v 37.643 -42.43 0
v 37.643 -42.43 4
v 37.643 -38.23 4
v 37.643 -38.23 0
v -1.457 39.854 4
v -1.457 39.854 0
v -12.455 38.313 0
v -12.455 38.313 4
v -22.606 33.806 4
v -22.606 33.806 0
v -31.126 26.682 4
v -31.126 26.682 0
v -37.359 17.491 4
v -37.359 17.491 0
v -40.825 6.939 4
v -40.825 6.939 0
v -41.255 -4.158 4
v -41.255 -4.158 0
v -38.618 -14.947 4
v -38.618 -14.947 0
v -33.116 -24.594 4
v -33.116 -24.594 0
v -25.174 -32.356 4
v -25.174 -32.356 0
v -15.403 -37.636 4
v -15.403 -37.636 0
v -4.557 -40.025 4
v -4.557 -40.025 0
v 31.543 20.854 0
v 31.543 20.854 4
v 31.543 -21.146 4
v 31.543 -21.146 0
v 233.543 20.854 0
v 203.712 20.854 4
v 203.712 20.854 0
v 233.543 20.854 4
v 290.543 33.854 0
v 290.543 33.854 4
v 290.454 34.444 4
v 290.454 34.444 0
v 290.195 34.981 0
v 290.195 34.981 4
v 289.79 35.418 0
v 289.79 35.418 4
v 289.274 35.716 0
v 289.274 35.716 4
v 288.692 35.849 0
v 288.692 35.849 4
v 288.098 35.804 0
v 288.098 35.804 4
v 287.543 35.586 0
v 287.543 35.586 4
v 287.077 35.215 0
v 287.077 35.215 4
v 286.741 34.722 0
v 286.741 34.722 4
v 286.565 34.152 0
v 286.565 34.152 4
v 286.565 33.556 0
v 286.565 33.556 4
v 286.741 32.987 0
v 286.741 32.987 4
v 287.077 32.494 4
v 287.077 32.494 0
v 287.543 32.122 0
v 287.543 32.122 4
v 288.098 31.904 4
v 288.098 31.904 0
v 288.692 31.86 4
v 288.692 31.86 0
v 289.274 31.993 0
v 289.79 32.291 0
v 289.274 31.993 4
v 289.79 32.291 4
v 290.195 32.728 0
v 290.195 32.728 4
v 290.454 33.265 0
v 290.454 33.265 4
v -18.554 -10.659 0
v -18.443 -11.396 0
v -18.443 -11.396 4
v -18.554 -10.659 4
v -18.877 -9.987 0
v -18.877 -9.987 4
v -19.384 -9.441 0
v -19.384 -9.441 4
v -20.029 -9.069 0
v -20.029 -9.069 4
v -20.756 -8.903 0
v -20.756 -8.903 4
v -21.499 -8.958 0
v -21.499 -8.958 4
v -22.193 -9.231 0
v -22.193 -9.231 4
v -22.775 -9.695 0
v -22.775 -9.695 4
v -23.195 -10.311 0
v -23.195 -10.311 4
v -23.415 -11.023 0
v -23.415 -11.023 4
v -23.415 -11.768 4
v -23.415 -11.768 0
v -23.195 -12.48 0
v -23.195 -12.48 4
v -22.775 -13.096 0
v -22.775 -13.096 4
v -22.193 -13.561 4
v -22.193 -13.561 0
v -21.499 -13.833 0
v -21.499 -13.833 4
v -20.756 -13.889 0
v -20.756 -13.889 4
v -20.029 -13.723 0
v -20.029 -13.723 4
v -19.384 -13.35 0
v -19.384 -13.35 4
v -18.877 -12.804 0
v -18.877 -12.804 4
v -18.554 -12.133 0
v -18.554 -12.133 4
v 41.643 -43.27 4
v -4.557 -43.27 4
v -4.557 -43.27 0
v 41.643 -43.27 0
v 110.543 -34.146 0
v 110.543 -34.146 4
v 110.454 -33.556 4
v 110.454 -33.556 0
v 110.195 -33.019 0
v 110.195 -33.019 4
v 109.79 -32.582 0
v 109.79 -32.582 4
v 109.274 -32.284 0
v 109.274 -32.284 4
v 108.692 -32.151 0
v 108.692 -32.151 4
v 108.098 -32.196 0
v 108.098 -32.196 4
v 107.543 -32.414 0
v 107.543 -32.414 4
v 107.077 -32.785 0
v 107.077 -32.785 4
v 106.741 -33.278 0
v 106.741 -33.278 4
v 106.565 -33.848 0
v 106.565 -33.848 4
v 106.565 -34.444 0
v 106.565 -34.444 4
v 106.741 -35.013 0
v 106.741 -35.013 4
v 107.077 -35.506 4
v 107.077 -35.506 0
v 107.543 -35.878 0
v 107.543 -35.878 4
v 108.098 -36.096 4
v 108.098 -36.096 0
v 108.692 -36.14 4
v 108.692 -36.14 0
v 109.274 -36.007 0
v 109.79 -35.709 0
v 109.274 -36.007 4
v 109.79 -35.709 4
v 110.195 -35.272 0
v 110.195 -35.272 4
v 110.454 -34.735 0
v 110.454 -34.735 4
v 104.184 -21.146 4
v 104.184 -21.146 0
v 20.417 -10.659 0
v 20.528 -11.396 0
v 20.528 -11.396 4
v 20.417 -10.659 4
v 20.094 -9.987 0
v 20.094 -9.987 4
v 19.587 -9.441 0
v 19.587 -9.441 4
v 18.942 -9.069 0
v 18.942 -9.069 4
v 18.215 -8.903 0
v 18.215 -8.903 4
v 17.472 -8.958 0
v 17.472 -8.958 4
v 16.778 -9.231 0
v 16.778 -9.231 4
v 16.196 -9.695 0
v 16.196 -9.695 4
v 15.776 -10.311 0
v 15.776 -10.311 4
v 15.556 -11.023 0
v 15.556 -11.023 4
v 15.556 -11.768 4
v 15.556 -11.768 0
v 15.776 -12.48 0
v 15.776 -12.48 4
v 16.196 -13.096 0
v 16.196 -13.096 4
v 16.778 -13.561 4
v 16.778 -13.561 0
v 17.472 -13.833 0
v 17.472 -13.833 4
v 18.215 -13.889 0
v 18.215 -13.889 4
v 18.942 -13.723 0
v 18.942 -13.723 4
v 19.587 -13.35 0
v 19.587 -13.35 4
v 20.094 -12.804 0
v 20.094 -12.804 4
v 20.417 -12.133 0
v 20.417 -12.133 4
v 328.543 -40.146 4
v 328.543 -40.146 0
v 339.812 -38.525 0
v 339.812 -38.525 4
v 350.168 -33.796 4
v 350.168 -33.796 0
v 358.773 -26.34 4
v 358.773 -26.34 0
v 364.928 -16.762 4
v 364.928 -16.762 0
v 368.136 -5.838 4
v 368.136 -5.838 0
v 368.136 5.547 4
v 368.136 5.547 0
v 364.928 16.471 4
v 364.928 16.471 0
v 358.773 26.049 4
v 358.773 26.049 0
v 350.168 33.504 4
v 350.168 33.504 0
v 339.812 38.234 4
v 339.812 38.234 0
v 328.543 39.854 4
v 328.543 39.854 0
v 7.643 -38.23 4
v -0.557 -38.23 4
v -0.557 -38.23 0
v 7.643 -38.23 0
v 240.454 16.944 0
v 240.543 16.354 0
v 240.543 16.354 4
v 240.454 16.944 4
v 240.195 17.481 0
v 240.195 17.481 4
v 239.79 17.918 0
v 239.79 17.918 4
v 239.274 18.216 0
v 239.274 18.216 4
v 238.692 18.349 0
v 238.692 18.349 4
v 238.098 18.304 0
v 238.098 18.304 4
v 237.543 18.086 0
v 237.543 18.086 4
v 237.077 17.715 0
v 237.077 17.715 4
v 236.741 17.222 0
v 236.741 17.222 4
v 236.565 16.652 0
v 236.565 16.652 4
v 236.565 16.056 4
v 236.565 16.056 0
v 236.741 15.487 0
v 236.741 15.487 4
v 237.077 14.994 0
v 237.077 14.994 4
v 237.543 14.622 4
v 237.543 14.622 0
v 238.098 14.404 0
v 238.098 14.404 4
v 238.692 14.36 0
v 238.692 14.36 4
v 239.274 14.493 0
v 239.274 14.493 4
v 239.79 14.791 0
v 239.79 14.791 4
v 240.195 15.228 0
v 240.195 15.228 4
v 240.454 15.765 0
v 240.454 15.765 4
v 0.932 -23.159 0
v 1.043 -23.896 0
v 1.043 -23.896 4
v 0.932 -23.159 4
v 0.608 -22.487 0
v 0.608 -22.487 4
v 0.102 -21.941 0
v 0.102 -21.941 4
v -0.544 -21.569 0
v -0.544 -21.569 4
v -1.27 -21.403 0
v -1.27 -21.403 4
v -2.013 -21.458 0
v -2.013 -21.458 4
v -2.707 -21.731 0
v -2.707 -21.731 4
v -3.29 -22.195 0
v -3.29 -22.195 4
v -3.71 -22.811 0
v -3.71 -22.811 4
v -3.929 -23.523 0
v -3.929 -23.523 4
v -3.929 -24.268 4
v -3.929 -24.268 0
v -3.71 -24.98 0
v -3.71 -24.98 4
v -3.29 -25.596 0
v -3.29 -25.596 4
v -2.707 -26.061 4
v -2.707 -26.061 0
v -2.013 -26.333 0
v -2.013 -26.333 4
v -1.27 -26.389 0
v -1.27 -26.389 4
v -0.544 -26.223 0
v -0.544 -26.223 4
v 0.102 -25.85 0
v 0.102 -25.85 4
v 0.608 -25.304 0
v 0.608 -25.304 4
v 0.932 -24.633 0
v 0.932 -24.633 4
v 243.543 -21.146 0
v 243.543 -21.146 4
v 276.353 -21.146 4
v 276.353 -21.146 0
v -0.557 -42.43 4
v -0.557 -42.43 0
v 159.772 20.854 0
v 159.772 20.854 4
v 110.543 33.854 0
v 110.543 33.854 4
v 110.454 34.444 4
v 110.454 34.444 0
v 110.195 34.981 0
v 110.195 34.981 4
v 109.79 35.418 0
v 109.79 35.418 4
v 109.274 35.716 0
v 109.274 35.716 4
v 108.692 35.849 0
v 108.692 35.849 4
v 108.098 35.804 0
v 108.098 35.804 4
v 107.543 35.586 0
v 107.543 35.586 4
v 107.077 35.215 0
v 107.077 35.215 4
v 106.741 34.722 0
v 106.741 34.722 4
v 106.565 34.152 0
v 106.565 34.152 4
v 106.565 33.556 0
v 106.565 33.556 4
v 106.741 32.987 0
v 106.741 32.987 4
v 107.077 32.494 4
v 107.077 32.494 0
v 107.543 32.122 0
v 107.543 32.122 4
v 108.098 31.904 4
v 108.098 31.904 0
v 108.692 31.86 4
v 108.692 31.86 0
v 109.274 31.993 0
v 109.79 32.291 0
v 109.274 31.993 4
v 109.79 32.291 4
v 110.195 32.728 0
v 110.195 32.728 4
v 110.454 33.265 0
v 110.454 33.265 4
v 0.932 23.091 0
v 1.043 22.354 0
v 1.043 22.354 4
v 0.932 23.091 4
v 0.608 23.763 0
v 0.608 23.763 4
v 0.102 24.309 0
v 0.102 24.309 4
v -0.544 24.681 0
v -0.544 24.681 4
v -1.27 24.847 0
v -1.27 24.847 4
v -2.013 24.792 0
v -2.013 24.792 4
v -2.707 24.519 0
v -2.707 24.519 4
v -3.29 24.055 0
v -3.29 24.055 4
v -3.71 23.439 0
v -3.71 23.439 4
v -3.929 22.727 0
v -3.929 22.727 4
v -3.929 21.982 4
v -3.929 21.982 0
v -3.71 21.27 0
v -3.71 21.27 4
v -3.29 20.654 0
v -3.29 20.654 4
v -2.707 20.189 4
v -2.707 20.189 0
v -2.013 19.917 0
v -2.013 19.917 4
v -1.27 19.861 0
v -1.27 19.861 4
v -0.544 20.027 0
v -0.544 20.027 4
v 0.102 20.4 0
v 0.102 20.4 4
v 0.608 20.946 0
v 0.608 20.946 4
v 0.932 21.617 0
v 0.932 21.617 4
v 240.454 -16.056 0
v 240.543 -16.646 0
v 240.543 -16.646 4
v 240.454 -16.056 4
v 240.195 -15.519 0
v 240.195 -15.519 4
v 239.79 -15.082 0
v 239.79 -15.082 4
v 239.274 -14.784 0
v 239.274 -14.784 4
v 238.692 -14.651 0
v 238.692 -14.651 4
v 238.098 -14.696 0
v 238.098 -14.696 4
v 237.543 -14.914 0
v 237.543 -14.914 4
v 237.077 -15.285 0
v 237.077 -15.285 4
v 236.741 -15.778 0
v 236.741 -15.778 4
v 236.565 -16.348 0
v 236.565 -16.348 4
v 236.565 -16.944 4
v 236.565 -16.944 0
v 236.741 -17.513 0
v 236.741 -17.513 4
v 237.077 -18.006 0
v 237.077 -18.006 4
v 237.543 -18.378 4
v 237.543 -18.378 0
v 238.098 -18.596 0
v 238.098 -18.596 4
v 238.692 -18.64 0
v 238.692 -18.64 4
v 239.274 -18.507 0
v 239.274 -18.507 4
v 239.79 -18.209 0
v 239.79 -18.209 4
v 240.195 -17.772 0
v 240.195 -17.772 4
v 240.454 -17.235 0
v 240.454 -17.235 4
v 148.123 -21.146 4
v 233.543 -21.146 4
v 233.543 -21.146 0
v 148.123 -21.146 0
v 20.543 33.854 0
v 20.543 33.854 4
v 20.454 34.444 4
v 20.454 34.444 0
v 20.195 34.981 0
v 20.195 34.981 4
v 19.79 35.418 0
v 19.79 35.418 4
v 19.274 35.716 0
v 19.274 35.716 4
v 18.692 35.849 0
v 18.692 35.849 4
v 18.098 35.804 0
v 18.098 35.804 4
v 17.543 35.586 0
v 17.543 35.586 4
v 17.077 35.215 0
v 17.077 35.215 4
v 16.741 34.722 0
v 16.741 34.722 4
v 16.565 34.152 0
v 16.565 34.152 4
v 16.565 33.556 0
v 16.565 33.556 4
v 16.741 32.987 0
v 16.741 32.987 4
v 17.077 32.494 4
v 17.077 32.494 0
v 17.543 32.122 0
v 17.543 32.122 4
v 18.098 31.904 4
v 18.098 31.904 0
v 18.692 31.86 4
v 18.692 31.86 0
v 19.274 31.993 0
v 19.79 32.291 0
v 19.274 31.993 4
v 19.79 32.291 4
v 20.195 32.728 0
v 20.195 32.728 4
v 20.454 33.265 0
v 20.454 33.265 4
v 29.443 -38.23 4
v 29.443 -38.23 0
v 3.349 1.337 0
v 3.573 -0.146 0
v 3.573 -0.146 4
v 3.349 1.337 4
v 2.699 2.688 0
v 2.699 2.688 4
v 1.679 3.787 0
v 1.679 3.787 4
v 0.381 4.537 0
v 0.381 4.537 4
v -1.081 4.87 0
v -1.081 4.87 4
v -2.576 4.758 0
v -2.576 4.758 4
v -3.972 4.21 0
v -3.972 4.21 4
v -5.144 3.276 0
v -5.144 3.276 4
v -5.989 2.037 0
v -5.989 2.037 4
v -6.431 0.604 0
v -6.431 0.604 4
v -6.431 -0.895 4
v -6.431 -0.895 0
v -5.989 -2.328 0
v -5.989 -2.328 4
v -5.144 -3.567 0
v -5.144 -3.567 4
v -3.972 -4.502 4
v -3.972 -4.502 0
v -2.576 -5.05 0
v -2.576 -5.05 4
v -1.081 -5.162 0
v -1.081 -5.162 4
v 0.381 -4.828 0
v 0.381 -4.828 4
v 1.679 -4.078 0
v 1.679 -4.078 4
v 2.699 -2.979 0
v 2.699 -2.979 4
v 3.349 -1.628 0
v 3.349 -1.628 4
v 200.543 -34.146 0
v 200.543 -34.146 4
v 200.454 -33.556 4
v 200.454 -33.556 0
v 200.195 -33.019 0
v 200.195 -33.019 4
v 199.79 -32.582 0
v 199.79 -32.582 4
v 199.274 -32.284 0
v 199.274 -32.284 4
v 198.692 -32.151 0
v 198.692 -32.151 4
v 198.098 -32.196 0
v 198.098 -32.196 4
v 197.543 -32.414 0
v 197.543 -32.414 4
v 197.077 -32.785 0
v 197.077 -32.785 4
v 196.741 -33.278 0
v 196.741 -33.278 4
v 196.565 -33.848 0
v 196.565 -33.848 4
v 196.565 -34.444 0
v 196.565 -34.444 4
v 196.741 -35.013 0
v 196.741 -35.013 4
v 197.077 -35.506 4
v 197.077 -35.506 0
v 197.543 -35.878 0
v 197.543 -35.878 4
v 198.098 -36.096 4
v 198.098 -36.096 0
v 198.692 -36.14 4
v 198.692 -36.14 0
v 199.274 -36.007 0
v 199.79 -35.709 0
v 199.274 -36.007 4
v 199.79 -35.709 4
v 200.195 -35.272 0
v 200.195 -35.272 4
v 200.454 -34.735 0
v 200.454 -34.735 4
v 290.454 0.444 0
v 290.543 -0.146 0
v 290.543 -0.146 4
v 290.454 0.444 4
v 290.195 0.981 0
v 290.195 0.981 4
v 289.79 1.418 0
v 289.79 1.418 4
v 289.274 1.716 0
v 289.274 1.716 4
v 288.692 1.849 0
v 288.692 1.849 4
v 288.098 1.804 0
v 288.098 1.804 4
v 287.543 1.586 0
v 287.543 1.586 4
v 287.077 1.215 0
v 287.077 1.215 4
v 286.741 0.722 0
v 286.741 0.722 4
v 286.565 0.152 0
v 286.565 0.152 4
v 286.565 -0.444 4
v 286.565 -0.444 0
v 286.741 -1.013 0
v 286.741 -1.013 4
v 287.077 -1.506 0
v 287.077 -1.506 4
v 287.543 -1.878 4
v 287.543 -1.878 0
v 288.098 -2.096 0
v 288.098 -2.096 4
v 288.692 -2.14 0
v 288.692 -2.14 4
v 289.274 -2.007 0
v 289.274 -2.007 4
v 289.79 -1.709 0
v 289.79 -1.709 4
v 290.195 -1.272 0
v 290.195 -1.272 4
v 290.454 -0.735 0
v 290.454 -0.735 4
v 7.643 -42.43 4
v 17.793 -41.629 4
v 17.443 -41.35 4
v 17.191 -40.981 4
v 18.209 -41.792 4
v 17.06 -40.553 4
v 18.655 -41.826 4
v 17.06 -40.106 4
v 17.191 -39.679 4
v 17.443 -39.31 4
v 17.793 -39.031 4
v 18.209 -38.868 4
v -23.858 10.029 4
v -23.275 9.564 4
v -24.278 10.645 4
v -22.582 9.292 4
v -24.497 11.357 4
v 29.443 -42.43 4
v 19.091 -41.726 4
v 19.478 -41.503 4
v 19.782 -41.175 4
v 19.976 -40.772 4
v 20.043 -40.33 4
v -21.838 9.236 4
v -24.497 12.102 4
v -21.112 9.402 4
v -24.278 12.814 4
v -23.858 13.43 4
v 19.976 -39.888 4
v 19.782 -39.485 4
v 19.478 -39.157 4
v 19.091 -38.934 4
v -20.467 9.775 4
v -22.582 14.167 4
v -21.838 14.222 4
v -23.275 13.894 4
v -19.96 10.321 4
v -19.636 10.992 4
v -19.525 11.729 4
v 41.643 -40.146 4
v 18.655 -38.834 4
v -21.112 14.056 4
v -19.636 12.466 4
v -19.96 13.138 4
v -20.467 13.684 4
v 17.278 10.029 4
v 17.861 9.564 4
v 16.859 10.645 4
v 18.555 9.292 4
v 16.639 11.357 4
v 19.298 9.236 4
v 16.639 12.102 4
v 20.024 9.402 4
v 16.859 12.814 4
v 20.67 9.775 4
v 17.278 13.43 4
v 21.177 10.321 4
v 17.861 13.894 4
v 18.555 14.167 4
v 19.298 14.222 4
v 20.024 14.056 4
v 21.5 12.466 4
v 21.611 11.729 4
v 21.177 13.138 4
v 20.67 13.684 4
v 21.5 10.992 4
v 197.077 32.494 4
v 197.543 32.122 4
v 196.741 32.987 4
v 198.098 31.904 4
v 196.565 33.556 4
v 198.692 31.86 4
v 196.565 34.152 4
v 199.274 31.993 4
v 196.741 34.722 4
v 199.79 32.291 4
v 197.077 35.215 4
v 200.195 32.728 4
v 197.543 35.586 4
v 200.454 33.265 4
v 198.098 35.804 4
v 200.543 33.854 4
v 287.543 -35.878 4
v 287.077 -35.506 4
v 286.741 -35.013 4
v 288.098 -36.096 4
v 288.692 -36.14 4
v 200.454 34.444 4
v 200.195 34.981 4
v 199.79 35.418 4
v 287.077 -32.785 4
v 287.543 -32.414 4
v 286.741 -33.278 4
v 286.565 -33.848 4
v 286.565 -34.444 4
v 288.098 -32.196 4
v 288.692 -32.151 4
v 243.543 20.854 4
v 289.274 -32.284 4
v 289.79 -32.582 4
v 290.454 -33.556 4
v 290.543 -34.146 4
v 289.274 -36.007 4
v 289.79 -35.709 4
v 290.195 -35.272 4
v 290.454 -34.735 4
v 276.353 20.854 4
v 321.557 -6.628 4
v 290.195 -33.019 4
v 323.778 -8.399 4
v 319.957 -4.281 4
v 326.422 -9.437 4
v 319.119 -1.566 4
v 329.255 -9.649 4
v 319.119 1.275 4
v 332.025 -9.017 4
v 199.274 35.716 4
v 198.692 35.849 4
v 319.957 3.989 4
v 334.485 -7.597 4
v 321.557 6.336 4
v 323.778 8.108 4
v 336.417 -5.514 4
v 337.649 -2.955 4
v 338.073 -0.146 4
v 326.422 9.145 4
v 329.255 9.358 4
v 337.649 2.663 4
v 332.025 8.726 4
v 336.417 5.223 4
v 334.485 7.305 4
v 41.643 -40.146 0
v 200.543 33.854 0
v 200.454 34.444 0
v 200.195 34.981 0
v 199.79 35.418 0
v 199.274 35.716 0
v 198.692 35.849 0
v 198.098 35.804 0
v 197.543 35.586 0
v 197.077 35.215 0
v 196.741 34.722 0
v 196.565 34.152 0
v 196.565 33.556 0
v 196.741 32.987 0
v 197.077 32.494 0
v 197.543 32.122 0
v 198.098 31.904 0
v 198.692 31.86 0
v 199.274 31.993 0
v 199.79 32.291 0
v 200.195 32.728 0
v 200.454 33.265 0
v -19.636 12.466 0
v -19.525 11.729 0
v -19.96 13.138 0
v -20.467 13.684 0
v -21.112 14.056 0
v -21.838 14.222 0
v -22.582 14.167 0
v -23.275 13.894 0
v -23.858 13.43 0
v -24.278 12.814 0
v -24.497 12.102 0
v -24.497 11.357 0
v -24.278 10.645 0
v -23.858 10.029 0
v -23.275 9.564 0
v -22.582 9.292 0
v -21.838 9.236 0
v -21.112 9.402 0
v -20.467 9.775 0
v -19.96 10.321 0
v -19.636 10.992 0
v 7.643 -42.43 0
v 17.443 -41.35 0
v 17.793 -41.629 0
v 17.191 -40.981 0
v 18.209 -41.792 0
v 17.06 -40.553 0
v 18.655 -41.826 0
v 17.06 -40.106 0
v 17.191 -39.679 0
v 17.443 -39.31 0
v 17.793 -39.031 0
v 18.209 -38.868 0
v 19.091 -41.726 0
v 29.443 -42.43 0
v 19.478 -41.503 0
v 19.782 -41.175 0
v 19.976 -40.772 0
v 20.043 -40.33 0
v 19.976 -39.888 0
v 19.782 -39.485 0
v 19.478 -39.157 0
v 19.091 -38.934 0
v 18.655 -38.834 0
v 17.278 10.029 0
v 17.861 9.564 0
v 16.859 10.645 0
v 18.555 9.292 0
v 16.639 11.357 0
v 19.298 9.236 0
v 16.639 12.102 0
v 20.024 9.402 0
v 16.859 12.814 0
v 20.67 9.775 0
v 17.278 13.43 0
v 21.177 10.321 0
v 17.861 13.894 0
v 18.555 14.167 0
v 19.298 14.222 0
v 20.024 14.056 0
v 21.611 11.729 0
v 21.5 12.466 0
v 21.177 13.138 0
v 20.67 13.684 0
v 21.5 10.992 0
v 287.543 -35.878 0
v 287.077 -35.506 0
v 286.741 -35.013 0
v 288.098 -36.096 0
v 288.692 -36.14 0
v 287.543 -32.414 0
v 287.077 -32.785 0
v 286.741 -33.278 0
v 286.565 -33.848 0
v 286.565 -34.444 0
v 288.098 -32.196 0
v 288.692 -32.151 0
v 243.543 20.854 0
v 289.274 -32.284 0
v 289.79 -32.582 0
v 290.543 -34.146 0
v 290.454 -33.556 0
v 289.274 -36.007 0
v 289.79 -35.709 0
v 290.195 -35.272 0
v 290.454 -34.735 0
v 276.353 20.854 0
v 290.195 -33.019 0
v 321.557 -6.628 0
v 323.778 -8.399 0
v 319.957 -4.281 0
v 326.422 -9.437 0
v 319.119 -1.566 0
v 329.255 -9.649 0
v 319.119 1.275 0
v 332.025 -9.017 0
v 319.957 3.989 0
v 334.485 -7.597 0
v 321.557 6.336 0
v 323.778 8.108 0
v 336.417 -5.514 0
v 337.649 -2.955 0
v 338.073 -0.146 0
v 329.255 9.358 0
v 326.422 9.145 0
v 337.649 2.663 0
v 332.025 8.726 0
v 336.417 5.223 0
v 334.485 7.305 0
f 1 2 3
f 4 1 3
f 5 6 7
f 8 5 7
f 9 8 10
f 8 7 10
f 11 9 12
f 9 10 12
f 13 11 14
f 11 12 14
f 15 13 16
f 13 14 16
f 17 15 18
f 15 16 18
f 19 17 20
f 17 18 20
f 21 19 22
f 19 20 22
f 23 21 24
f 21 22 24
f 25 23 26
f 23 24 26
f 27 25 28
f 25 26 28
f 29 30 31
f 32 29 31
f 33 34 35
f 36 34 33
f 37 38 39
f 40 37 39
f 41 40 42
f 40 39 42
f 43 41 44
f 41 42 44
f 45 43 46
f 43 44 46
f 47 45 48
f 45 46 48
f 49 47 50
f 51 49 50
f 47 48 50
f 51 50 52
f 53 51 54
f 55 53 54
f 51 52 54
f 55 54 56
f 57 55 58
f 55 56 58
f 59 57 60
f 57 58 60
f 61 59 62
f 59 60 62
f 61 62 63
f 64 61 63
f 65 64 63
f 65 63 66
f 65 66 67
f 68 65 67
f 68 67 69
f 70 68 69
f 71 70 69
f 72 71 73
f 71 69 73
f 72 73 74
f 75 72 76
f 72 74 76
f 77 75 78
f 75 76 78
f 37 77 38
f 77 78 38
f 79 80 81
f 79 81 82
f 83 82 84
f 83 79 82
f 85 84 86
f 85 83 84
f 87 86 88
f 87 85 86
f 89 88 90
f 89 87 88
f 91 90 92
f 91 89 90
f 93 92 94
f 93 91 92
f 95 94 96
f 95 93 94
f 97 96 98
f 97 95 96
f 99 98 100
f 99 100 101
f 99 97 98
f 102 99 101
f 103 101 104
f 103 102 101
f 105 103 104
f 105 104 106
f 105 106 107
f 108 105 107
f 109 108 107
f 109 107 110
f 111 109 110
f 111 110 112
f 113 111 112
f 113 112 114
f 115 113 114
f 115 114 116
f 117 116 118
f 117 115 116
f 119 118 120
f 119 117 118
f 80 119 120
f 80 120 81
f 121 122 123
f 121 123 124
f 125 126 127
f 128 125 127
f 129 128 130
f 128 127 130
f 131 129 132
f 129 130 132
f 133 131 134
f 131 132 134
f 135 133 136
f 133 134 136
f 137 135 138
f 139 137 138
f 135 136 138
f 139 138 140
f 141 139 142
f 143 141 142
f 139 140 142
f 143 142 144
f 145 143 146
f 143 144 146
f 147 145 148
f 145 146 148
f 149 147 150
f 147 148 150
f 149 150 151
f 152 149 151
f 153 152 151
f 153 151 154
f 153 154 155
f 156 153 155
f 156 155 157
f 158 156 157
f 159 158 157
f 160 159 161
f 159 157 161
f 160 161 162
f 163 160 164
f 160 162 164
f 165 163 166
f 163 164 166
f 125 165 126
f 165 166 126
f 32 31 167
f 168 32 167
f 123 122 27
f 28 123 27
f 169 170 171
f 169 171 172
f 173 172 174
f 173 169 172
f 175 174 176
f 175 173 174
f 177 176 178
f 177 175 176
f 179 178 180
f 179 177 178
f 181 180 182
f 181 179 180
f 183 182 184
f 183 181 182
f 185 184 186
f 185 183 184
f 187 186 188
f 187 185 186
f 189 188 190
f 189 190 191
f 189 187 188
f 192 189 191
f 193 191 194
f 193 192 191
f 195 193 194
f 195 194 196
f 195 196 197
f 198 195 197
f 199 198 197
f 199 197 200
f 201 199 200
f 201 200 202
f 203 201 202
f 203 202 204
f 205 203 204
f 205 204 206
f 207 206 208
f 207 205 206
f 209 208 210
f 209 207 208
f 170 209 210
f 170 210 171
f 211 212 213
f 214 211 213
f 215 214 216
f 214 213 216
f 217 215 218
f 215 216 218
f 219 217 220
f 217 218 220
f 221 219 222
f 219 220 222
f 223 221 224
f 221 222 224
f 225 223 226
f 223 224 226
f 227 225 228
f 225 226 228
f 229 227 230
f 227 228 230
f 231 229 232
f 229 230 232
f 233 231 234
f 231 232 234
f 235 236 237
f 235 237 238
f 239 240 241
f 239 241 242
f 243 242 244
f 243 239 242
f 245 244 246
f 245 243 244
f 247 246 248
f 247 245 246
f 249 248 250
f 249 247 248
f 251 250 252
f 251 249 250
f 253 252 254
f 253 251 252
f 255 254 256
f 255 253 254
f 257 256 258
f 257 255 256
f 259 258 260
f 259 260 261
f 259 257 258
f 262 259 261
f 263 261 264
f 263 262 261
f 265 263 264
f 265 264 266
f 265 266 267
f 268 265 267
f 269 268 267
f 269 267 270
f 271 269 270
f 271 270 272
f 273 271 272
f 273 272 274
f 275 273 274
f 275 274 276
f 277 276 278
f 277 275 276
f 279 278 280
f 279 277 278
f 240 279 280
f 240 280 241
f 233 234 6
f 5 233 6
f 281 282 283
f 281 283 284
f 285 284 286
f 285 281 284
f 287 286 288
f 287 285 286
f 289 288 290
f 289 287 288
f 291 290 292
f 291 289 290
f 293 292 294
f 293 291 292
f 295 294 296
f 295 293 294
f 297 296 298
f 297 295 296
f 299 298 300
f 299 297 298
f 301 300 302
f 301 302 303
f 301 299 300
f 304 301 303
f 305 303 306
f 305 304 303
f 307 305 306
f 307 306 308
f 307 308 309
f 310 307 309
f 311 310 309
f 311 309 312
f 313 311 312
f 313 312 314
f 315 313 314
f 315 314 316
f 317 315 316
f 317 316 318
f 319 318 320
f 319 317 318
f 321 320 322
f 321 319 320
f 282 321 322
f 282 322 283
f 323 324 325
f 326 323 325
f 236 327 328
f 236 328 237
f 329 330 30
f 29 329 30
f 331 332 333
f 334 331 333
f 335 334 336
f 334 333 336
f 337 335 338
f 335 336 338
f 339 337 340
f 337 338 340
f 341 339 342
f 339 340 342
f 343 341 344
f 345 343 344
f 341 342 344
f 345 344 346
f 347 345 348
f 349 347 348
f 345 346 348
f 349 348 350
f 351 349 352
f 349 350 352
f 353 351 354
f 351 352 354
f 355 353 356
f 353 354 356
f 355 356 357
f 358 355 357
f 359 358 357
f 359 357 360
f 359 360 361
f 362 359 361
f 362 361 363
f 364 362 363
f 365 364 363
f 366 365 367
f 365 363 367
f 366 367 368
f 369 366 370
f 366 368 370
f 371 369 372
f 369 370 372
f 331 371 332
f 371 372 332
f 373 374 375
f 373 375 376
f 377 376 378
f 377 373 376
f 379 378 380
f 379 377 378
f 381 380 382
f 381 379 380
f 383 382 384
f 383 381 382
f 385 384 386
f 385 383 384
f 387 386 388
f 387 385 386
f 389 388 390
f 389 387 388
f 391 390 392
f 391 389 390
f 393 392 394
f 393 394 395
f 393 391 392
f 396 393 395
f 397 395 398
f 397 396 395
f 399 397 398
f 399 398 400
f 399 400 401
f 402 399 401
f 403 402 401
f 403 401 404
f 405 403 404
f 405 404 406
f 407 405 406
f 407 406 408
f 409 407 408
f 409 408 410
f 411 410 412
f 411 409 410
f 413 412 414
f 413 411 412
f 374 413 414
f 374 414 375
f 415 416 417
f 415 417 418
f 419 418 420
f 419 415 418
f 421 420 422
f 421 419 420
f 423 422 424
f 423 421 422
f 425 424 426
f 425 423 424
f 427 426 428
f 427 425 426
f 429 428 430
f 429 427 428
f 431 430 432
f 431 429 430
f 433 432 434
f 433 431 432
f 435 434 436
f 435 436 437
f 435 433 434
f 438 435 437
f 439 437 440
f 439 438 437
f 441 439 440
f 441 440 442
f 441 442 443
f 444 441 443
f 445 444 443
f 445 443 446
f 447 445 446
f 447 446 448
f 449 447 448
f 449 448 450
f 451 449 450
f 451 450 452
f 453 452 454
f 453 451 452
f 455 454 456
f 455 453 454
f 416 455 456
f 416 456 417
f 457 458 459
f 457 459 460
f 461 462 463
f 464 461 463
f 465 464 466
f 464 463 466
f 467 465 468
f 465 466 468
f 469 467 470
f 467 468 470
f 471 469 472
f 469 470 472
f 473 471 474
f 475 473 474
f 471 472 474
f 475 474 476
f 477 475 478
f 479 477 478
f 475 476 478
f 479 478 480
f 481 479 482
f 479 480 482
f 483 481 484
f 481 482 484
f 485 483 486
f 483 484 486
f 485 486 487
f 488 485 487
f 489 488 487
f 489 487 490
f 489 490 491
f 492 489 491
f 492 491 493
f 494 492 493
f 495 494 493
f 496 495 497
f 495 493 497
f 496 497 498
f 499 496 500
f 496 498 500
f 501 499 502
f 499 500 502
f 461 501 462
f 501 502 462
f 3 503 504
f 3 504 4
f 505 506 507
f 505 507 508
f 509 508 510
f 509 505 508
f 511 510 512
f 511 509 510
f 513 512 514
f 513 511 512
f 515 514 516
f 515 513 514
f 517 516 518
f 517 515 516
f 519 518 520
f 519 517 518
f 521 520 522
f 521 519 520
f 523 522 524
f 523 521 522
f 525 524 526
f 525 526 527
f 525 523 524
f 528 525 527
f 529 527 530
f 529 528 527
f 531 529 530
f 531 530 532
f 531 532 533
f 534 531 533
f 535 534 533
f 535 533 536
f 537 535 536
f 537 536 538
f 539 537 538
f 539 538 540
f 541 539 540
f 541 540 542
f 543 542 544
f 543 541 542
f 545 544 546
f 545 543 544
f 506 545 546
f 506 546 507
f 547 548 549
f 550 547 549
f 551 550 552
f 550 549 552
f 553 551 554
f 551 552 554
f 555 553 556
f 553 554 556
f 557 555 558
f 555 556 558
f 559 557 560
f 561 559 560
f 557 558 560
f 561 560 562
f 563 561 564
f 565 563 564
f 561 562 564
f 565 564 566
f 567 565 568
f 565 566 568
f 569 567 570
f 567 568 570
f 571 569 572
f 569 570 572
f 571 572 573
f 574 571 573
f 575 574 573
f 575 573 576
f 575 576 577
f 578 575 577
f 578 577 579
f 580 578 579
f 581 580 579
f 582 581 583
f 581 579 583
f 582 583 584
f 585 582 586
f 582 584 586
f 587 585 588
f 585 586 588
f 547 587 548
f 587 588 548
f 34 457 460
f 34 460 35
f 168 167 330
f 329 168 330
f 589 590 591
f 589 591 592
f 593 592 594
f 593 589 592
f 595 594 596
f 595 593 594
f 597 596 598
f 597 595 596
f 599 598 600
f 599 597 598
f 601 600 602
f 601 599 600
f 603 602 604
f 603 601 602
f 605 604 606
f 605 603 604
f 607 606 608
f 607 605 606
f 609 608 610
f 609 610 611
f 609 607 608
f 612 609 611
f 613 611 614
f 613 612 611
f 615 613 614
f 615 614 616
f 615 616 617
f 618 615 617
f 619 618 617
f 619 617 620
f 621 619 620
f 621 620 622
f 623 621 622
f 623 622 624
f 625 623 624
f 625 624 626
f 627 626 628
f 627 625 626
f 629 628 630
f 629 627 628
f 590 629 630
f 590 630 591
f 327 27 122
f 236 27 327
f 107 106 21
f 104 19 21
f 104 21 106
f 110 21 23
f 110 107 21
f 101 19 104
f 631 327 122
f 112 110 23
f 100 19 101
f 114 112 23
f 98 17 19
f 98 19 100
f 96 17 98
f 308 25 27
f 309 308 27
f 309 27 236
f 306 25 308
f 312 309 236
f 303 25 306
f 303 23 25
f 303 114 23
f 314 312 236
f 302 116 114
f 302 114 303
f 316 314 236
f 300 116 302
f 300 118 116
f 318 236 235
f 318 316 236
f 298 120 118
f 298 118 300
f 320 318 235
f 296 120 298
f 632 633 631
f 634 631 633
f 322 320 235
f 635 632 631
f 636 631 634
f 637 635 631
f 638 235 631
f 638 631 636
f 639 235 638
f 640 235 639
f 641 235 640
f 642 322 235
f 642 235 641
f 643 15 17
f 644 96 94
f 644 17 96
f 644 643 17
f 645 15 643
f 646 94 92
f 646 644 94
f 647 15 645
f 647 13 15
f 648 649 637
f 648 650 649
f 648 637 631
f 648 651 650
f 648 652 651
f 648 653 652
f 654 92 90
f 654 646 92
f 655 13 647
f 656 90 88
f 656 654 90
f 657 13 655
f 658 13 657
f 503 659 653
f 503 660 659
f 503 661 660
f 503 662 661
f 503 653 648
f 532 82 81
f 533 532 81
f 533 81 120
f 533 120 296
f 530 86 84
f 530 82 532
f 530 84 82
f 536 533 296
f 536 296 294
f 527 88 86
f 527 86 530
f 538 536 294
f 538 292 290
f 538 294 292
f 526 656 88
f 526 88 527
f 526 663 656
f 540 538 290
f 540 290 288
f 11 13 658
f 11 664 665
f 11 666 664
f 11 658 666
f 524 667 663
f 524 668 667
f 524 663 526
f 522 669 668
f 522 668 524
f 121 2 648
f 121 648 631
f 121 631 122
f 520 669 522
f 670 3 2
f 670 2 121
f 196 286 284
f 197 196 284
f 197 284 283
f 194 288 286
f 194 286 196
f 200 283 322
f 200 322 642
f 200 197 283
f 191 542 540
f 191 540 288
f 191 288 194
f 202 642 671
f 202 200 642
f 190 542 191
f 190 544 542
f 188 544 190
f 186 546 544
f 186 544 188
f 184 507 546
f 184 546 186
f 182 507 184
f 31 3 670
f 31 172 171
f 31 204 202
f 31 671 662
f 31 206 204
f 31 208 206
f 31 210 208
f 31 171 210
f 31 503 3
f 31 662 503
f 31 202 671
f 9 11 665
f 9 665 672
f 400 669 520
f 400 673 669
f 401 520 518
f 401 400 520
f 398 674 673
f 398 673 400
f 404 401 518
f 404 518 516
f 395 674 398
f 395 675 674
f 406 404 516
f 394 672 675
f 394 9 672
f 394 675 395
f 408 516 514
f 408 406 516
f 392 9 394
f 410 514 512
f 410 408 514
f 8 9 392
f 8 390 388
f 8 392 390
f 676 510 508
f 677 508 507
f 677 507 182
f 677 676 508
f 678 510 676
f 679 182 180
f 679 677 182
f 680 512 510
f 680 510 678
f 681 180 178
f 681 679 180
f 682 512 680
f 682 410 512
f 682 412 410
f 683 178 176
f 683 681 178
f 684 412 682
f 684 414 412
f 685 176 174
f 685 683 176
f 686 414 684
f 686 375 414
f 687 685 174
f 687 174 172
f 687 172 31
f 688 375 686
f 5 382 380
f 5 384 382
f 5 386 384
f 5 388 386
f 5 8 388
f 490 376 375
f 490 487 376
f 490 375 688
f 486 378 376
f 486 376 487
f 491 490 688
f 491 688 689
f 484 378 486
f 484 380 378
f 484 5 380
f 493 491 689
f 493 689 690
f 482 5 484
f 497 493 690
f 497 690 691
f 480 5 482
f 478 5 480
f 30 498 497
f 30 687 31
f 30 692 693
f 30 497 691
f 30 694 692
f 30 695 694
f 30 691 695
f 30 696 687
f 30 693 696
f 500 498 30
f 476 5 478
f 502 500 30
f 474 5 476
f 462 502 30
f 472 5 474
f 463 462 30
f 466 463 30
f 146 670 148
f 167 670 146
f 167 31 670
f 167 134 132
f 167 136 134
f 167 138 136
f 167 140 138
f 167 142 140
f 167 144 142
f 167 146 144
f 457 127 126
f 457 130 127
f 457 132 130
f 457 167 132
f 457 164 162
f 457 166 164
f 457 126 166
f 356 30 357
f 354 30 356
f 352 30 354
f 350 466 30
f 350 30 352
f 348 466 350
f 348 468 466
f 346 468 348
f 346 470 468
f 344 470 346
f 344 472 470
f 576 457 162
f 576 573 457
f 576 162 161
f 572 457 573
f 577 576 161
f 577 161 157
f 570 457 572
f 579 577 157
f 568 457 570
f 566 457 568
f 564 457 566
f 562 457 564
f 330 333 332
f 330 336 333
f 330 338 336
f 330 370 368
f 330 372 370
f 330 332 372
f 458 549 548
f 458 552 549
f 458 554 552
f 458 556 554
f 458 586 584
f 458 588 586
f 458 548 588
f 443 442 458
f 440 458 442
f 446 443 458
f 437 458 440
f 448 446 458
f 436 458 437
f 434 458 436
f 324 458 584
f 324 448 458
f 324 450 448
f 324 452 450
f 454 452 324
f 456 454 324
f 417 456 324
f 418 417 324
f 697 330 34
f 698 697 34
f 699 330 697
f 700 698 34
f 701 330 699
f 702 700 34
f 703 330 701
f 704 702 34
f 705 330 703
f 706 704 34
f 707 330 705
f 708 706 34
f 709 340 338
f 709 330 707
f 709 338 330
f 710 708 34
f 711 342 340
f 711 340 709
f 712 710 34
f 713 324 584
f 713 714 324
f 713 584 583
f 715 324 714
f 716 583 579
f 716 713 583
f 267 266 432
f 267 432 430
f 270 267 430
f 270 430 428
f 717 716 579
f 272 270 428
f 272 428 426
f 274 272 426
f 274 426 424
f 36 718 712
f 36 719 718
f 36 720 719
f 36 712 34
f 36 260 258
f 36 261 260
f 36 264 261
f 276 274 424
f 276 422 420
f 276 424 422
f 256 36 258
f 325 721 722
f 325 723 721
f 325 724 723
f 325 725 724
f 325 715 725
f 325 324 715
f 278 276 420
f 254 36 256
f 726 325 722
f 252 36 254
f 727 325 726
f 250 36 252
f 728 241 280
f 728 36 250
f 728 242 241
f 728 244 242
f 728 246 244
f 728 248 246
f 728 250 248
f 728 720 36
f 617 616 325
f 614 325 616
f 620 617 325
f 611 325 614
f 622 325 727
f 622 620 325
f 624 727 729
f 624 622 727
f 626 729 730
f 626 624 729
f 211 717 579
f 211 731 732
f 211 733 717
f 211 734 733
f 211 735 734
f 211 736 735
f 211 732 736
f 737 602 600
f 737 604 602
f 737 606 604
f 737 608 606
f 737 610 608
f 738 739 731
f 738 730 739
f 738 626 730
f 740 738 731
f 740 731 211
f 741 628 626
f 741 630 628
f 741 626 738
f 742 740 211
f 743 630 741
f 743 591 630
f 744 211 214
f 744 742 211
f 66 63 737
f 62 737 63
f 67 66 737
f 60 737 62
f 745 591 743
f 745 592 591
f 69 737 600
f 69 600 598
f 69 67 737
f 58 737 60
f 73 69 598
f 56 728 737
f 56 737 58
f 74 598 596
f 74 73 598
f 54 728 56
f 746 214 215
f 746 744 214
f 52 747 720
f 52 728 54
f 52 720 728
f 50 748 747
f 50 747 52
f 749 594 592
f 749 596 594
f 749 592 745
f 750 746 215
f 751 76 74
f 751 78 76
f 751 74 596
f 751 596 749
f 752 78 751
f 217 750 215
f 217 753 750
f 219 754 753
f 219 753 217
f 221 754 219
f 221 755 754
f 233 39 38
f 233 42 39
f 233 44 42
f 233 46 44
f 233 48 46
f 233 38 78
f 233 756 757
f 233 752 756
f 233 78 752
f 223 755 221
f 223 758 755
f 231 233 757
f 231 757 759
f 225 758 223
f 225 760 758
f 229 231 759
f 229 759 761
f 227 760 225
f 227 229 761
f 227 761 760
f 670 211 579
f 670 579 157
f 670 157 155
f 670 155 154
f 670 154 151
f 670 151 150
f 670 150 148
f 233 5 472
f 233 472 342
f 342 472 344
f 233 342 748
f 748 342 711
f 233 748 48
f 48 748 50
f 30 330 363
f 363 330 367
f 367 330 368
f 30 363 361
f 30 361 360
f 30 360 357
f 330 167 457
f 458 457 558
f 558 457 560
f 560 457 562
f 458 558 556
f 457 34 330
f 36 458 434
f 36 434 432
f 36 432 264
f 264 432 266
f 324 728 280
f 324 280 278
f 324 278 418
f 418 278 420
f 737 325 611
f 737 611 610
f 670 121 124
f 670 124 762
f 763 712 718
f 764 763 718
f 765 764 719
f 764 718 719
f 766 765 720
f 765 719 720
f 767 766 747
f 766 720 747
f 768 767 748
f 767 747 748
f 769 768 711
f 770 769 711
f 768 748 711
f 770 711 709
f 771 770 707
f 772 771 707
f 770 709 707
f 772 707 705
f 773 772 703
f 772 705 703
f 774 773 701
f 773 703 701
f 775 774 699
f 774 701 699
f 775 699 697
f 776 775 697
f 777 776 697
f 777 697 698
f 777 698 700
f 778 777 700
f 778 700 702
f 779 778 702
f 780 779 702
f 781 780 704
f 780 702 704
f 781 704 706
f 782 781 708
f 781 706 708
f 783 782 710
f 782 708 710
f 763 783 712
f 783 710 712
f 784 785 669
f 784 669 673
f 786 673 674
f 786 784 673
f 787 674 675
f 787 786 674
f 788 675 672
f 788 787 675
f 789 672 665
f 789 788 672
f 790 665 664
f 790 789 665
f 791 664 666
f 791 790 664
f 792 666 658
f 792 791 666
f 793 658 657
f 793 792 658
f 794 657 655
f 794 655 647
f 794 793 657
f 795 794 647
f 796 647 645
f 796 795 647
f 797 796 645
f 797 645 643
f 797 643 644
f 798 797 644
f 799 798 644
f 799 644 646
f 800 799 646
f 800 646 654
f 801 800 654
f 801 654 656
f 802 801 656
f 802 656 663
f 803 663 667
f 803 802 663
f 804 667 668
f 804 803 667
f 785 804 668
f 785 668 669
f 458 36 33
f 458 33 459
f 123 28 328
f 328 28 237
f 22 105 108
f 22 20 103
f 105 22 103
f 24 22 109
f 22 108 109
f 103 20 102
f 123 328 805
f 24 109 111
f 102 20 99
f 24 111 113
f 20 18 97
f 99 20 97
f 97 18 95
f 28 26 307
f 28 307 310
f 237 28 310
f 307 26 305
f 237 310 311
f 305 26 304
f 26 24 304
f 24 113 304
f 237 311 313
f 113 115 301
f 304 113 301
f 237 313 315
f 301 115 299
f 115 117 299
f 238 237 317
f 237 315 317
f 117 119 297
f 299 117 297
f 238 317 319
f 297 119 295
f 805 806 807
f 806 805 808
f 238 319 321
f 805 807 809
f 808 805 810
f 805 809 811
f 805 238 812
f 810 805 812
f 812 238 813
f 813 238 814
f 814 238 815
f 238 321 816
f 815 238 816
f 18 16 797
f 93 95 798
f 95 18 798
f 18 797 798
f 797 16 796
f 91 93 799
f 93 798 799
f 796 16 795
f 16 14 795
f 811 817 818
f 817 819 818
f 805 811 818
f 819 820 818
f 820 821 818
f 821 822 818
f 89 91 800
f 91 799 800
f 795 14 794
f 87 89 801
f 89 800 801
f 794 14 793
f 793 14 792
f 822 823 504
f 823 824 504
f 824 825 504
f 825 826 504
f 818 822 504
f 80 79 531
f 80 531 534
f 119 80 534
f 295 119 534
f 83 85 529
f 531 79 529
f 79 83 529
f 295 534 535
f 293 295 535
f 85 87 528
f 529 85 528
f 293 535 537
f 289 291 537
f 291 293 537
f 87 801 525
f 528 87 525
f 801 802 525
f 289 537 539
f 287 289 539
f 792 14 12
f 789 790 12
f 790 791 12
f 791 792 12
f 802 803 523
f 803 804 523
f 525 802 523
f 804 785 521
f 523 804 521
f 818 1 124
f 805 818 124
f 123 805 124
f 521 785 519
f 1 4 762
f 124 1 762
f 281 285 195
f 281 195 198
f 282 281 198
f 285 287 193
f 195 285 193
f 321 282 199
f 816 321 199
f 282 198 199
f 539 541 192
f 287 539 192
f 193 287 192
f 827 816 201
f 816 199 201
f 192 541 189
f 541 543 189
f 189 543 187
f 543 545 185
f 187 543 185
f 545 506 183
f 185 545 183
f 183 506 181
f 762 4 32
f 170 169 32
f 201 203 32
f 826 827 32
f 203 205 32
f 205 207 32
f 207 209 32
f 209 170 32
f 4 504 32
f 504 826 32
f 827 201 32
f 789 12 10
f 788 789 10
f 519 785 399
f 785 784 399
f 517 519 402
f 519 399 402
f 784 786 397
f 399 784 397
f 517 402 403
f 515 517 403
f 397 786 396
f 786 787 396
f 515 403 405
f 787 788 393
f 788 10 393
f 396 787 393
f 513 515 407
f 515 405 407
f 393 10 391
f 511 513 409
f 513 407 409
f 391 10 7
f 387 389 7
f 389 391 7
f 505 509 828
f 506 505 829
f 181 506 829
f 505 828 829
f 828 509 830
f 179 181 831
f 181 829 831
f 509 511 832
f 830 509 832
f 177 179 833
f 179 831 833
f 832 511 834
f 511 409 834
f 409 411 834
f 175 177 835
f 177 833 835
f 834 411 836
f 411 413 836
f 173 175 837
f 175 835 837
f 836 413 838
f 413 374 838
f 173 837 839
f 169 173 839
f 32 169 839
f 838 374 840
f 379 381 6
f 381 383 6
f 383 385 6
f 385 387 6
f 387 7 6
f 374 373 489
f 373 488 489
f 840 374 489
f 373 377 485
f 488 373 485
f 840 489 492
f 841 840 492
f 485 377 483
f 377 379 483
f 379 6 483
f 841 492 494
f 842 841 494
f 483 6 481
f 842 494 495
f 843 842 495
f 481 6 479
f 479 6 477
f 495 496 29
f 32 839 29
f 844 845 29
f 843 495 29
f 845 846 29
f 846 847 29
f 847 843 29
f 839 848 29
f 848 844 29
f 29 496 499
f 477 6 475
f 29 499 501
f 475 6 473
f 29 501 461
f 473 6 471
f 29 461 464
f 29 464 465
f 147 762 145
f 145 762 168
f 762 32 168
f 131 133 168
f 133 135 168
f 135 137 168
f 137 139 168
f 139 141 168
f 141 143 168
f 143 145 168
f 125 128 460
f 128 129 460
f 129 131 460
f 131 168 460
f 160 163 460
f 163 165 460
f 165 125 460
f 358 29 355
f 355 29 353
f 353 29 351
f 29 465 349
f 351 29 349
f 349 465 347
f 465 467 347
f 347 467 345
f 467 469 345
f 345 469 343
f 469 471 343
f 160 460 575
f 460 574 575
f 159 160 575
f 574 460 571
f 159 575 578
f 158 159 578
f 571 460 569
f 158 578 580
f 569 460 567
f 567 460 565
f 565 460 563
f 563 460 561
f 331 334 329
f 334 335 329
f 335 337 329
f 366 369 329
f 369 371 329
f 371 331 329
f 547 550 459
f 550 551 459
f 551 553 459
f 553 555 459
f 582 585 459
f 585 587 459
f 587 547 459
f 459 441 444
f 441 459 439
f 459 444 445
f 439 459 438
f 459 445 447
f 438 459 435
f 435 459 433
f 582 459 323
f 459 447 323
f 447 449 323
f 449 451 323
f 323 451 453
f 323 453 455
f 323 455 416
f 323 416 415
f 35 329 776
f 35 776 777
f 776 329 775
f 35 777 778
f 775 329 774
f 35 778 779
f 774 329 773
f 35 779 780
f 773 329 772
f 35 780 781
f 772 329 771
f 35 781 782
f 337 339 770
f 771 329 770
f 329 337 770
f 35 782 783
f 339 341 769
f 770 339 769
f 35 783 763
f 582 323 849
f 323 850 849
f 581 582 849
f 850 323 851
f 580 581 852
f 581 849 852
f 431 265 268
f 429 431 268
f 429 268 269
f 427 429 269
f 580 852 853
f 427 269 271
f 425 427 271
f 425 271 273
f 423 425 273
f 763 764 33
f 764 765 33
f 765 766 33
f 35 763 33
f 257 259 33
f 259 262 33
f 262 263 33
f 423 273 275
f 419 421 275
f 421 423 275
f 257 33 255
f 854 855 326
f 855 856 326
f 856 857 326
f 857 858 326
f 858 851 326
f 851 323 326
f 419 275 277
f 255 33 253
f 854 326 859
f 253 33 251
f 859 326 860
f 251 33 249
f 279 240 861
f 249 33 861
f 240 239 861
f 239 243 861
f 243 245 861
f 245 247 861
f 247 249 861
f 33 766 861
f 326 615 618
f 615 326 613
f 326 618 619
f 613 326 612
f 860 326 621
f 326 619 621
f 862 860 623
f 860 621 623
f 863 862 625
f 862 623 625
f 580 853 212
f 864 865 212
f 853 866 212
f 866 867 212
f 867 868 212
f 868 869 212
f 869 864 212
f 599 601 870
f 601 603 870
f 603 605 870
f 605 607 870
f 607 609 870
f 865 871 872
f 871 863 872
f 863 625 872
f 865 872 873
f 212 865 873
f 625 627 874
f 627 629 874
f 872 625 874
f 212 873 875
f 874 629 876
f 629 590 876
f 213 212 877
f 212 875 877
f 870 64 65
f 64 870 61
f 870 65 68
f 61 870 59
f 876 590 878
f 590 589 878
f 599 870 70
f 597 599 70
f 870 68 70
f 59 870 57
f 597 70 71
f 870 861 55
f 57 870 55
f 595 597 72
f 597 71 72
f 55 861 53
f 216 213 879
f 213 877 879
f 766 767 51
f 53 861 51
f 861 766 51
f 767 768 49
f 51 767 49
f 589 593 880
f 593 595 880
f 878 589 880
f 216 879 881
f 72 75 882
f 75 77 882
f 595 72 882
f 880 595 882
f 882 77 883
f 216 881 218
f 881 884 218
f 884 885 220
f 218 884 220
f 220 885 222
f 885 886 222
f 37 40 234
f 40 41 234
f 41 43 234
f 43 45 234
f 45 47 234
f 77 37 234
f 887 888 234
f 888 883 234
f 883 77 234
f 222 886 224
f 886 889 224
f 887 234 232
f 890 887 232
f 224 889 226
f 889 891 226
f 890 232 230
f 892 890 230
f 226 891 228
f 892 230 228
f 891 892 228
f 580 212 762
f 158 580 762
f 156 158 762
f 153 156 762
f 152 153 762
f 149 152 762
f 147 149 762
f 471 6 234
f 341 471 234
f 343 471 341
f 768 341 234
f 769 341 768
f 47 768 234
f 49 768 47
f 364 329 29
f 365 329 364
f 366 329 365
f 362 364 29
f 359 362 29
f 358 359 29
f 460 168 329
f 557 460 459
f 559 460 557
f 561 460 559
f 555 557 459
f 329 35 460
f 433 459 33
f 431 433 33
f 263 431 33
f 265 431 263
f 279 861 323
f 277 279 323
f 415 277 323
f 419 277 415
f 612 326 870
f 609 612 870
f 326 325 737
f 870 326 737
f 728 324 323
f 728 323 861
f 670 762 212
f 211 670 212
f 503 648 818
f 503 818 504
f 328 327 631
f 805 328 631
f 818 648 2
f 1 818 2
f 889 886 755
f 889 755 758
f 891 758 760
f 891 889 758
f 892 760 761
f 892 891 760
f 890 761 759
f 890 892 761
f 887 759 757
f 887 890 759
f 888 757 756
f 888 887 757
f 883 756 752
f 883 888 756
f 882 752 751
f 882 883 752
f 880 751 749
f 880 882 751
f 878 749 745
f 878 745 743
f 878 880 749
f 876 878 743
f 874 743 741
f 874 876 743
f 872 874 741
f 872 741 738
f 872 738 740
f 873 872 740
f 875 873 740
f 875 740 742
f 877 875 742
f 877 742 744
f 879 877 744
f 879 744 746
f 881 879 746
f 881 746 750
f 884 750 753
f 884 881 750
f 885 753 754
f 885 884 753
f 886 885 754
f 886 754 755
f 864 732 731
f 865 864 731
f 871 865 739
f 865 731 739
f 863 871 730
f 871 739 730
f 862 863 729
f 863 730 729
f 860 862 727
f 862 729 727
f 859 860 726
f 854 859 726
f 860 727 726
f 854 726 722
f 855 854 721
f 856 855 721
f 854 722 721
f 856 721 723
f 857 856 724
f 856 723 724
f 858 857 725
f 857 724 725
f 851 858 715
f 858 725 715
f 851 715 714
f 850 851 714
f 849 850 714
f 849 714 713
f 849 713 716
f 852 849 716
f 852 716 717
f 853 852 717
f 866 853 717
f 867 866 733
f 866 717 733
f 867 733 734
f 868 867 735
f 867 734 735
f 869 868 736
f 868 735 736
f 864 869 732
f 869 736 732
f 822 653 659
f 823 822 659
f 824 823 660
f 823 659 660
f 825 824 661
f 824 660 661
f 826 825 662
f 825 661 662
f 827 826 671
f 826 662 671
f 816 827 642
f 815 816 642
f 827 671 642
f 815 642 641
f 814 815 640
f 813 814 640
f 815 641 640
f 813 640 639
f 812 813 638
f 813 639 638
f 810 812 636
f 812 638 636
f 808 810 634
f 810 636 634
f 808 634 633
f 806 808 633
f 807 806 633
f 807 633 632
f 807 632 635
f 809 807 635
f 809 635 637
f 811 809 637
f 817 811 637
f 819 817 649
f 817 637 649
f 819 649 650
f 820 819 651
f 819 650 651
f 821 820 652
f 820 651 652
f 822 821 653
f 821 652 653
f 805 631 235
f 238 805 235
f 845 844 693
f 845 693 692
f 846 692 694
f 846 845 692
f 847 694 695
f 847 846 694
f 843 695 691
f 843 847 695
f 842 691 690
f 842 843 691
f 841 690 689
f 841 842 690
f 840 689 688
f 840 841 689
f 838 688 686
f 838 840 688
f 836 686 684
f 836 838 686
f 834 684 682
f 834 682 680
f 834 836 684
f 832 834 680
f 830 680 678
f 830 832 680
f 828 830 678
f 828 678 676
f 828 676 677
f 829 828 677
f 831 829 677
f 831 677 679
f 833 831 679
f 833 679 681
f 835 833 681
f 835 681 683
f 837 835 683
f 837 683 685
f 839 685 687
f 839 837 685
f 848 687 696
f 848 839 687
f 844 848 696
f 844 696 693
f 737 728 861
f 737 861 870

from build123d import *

# Parameters (mm, degrees)
SKETCH_1_R          = 2.5
SKETCH_1_R_2        = 5.03
SKETCH_1_R_3        = 2
SKETCH_1_R_4        = 9.53
EXTRUDE_1_DEPTH     = 4
SKETCH_3_W          = 46.2
SKETCH_3_H          = 3.817212264
EXTRUDE_2_DEPTH     = 4
SKETCH_2_R          = 2
SKETCH_2_R_2        = 1.5
SKETCH_2_W          = 32.809844138
SKETCH_2_H          = 42
SKETCH_2_W_2        = 8.2
SKETCH_2_H_2        = 4.2
CUT_EXTRUDE_1_DEPTH = 4


with BuildPart() as part:
    # 草图1 → 凸台-拉伸1 (new body)
    with BuildSketch(Plane.XY):
        with BuildLine():
            ThreePointArc((-1.457142857, 39.854285714), (-41.457142857, -0.145714286), (-1.457142857, -40.145714286))
            Line((-1.457142857, -40.145714286), (328.542857143, -40.145714286))
            ThreePointArc((328.542857143, -40.145714286), (368.542857143, -0.145714286), (328.542857143, 39.854285714))
            Line((328.542857143, 39.854285714), (-1.457142857, 39.854285714))
        make_face()
        with Locations((-1.457142857, -23.895714286)):
            Circle(SKETCH_1_R, mode=Mode.SUBTRACT)
        with Locations((-20.942714442, -11.395714286)):
            Circle(SKETCH_1_R, mode=Mode.SUBTRACT)
        with Locations((18.028428728, -11.395714286)):
            Circle(SKETCH_1_R, mode=Mode.SUBTRACT)
        with Locations((-1.457142857, -0.145714286)):
            Circle(SKETCH_1_R_2, mode=Mode.SUBTRACT)
        with Locations((238.542857143, -16.645714286)):
            Circle(SKETCH_1_R_3, mode=Mode.SUBTRACT)
        with Locations((288.542857143, -0.145714286)):
            Circle(SKETCH_1_R_3, mode=Mode.SUBTRACT)
        with Locations((328.542857143, -0.145714286)):
            Circle(SKETCH_1_R_4, mode=Mode.SUBTRACT)
        with Locations((-22.025246197, 11.729285714)):
            Circle(SKETCH_1_R, mode=Mode.SUBTRACT)
        with Locations((19.110960483, 11.729285714)):
            Circle(SKETCH_1_R, mode=Mode.SUBTRACT)
        with Locations((-1.457142857, 22.354285714)):
            Circle(SKETCH_1_R, mode=Mode.SUBTRACT)
        with Locations((238.542857143, 16.354285714)):
            Circle(SKETCH_1_R_3, mode=Mode.SUBTRACT)
    extrude(amount=EXTRUDE_1_DEPTH)

    # 草图3 → 凸台-拉伸2 (add)
    with BuildSketch(Plane.XY.offset(4)):
        with Locations((18.542857143, -41.36131722)):
            Rectangle(SKETCH_3_W, SKETCH_3_H)
    extrude(amount=-EXTRUDE_2_DEPTH)

    # 草图2 → 切除-拉伸1 (cut)
    with BuildSketch(Plane.XY.offset(4)):
        with Locations((18.542857143, 33.854285714)):
            Circle(SKETCH_2_R)
        with Locations((108.542857143, 33.854285714)):
            Circle(SKETCH_2_R)
        with Locations((198.542857143, 33.854285714)):
            Circle(SKETCH_2_R)
        with Locations((288.542857143, 33.854285714)):
            Circle(SKETCH_2_R)
        with Locations((108.542857143, -34.145714286)):
            Circle(SKETCH_2_R)
        with Locations((198.542857143, -34.145714286)):
            Circle(SKETCH_2_R)
        with Locations((288.542857143, -34.145714286)):
            Circle(SKETCH_2_R)
        with Locations((18.542857143, -40.329923352)):
            Circle(SKETCH_2_R_2)
        Polygon((31.542857143, -21.145714286), (104.183898028, -21.145714286), (159.772133322, 20.854285714), (31.542857143, 20.854285714), align=None)
        Polygon((148.123425102, -21.145714286), (203.711660396, 20.854285714), (233.542857143, 20.854285714), (233.542857143, -21.145714286), align=None)
        with Locations((259.947779212, -0.145714286)):
            Rectangle(SKETCH_2_W, SKETCH_2_H)
        with Locations((33.542857143, -40.329923352)):
            Rectangle(SKETCH_2_W_2, SKETCH_2_H_2)
        with Locations((3.542857143, -40.329923352)):
            Rectangle(SKETCH_2_W_2, SKETCH_2_H_2)
    extrude(amount=-CUT_EXTRUDE_1_DEPTH, mode=Mode.SUBTRACT)


solid = part.part
